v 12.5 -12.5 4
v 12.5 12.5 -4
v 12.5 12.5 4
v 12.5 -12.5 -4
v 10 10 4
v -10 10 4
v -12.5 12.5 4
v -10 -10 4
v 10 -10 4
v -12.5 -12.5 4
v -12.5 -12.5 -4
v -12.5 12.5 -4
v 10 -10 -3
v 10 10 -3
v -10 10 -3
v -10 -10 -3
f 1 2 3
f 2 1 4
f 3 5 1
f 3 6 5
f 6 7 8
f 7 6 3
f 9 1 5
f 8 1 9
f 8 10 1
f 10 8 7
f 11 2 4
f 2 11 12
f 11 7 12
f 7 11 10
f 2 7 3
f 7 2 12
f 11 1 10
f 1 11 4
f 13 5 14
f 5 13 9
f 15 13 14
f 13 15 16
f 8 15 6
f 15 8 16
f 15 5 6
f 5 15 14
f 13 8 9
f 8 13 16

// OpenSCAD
difference(){
cube([25,25,8],center=true);
translate([0,0,3])
{
    cube([20,20,12],center=true);
}
}
